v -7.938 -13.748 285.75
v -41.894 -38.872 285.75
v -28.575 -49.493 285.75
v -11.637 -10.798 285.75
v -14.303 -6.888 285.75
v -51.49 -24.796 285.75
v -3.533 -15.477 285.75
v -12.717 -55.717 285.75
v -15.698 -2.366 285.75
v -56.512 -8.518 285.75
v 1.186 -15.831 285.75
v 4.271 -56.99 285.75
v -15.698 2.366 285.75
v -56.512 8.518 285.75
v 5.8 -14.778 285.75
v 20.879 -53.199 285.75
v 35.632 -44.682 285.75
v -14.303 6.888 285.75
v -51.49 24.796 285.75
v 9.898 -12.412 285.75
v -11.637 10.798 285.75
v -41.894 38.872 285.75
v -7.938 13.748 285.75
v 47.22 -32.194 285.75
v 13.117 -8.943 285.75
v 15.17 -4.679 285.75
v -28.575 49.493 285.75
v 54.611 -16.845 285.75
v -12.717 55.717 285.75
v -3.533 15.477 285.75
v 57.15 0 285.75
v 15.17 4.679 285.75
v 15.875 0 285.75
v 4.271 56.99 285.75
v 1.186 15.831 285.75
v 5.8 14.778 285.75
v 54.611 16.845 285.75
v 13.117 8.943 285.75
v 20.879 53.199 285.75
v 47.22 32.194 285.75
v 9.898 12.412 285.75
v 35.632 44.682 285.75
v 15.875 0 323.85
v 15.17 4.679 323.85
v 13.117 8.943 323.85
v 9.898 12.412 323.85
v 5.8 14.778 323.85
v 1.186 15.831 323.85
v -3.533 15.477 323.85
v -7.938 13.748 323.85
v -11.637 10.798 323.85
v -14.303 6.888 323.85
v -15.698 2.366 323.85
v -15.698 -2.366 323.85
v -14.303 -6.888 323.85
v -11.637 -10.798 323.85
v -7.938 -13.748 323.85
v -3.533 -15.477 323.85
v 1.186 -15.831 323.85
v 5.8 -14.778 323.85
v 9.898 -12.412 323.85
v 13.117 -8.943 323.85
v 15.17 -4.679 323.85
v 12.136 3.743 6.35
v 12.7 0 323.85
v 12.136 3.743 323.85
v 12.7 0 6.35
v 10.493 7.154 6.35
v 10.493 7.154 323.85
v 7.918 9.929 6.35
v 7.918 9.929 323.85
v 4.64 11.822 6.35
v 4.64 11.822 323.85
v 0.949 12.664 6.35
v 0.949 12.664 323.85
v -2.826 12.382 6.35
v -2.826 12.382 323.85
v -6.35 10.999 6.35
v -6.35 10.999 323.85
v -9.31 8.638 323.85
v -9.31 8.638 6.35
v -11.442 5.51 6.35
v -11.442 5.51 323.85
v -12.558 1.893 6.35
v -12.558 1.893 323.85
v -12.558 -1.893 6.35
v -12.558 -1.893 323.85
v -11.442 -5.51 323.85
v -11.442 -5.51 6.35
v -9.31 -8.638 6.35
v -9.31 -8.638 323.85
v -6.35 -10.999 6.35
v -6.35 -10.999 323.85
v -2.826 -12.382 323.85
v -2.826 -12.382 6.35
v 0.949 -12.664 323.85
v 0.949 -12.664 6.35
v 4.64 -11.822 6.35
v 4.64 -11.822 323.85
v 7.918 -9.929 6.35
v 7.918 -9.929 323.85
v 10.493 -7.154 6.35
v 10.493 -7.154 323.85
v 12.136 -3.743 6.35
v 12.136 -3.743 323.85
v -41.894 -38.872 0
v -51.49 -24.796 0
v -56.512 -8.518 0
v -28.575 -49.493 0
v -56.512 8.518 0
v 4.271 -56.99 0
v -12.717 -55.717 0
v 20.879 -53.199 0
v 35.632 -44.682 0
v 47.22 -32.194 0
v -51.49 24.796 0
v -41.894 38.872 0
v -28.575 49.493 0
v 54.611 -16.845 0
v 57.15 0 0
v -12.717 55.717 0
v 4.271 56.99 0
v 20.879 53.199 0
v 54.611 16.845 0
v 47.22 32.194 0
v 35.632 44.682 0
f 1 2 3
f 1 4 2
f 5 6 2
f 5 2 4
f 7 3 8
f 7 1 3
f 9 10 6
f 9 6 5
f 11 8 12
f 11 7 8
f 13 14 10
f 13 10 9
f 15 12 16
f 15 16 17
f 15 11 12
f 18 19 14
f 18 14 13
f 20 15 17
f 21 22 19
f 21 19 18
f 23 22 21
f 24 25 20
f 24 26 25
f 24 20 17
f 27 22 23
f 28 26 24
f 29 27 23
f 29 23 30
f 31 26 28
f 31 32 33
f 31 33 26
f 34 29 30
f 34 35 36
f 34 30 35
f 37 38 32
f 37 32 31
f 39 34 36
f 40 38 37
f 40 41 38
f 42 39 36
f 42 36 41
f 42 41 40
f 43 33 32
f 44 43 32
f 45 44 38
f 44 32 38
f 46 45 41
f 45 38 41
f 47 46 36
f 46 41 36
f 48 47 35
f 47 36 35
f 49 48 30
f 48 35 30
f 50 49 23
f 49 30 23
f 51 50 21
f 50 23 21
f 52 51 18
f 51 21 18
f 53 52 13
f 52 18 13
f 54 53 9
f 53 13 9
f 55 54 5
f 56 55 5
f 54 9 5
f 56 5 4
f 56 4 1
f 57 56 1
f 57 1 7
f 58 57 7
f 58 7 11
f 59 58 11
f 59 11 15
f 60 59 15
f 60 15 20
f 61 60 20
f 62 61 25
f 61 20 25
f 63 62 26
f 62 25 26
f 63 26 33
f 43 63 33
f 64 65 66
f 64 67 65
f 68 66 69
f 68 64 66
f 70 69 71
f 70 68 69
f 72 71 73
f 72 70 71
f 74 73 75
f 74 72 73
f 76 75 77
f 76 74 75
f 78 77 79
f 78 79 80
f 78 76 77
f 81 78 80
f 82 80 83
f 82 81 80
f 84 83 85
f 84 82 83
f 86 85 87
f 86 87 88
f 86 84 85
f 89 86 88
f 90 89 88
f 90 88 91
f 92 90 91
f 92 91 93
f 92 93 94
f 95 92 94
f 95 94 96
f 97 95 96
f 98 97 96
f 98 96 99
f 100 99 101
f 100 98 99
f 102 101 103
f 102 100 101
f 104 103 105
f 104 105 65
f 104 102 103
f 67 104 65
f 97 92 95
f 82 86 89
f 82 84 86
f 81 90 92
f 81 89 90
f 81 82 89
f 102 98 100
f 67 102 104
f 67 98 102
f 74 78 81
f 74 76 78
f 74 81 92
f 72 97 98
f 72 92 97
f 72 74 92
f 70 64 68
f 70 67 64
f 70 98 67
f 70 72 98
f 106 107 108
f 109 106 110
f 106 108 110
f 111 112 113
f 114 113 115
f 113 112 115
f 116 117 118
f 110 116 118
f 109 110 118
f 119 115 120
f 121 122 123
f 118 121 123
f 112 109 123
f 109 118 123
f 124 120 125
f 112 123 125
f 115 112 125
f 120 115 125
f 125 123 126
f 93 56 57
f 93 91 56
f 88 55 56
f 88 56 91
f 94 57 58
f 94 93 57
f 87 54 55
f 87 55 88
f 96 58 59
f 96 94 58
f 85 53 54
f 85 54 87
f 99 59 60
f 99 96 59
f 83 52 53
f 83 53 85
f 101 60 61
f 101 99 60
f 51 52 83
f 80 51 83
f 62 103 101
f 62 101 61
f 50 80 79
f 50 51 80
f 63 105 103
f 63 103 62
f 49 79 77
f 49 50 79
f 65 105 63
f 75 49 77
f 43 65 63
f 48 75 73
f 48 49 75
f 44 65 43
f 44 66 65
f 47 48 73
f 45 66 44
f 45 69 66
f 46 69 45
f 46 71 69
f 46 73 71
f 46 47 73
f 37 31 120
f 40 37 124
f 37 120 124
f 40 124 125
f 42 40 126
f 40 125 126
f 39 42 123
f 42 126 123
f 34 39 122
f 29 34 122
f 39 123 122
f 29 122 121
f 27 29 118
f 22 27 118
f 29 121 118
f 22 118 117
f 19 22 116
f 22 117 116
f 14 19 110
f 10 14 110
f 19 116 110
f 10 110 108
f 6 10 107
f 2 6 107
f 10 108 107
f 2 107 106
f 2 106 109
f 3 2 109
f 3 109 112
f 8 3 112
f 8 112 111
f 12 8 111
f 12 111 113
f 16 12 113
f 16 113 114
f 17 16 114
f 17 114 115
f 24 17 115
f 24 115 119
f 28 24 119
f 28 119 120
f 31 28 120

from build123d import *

# Parameters (mm, degrees)
F0_R     = 57.15
F0_R_2   = 12.7
F1_DEPTH = 6.35
F2_DEPTH = 285.75
F3_R     = 15.875
F3_R_2   = 12.7
F4_DEPTH = 38.1


with BuildPart() as f1:
    # F0 (on Top) → F1 (new body)
    with BuildSketch(Plane.XY):
        Circle(F0_R)
        Circle(F0_R_2, mode=Mode.SUBTRACT)
        Circle(F0_R_2)
    extrude(amount=F1_DEPTH)

    # F0 (on Top) → F2 (join)
    with BuildSketch(Plane.XY):
        Circle(F0_R)
        Circle(F0_R_2, mode=Mode.SUBTRACT)
    extrude(amount=F2_DEPTH)

    # F3 (on face) → F4 (join)
    with BuildSketch(Plane.XY.offset(285.75)):
        Circle(F3_R)
        Circle(F3_R_2, mode=Mode.SUBTRACT)
    extrude(amount=F4_DEPTH)


solid = f1.part
